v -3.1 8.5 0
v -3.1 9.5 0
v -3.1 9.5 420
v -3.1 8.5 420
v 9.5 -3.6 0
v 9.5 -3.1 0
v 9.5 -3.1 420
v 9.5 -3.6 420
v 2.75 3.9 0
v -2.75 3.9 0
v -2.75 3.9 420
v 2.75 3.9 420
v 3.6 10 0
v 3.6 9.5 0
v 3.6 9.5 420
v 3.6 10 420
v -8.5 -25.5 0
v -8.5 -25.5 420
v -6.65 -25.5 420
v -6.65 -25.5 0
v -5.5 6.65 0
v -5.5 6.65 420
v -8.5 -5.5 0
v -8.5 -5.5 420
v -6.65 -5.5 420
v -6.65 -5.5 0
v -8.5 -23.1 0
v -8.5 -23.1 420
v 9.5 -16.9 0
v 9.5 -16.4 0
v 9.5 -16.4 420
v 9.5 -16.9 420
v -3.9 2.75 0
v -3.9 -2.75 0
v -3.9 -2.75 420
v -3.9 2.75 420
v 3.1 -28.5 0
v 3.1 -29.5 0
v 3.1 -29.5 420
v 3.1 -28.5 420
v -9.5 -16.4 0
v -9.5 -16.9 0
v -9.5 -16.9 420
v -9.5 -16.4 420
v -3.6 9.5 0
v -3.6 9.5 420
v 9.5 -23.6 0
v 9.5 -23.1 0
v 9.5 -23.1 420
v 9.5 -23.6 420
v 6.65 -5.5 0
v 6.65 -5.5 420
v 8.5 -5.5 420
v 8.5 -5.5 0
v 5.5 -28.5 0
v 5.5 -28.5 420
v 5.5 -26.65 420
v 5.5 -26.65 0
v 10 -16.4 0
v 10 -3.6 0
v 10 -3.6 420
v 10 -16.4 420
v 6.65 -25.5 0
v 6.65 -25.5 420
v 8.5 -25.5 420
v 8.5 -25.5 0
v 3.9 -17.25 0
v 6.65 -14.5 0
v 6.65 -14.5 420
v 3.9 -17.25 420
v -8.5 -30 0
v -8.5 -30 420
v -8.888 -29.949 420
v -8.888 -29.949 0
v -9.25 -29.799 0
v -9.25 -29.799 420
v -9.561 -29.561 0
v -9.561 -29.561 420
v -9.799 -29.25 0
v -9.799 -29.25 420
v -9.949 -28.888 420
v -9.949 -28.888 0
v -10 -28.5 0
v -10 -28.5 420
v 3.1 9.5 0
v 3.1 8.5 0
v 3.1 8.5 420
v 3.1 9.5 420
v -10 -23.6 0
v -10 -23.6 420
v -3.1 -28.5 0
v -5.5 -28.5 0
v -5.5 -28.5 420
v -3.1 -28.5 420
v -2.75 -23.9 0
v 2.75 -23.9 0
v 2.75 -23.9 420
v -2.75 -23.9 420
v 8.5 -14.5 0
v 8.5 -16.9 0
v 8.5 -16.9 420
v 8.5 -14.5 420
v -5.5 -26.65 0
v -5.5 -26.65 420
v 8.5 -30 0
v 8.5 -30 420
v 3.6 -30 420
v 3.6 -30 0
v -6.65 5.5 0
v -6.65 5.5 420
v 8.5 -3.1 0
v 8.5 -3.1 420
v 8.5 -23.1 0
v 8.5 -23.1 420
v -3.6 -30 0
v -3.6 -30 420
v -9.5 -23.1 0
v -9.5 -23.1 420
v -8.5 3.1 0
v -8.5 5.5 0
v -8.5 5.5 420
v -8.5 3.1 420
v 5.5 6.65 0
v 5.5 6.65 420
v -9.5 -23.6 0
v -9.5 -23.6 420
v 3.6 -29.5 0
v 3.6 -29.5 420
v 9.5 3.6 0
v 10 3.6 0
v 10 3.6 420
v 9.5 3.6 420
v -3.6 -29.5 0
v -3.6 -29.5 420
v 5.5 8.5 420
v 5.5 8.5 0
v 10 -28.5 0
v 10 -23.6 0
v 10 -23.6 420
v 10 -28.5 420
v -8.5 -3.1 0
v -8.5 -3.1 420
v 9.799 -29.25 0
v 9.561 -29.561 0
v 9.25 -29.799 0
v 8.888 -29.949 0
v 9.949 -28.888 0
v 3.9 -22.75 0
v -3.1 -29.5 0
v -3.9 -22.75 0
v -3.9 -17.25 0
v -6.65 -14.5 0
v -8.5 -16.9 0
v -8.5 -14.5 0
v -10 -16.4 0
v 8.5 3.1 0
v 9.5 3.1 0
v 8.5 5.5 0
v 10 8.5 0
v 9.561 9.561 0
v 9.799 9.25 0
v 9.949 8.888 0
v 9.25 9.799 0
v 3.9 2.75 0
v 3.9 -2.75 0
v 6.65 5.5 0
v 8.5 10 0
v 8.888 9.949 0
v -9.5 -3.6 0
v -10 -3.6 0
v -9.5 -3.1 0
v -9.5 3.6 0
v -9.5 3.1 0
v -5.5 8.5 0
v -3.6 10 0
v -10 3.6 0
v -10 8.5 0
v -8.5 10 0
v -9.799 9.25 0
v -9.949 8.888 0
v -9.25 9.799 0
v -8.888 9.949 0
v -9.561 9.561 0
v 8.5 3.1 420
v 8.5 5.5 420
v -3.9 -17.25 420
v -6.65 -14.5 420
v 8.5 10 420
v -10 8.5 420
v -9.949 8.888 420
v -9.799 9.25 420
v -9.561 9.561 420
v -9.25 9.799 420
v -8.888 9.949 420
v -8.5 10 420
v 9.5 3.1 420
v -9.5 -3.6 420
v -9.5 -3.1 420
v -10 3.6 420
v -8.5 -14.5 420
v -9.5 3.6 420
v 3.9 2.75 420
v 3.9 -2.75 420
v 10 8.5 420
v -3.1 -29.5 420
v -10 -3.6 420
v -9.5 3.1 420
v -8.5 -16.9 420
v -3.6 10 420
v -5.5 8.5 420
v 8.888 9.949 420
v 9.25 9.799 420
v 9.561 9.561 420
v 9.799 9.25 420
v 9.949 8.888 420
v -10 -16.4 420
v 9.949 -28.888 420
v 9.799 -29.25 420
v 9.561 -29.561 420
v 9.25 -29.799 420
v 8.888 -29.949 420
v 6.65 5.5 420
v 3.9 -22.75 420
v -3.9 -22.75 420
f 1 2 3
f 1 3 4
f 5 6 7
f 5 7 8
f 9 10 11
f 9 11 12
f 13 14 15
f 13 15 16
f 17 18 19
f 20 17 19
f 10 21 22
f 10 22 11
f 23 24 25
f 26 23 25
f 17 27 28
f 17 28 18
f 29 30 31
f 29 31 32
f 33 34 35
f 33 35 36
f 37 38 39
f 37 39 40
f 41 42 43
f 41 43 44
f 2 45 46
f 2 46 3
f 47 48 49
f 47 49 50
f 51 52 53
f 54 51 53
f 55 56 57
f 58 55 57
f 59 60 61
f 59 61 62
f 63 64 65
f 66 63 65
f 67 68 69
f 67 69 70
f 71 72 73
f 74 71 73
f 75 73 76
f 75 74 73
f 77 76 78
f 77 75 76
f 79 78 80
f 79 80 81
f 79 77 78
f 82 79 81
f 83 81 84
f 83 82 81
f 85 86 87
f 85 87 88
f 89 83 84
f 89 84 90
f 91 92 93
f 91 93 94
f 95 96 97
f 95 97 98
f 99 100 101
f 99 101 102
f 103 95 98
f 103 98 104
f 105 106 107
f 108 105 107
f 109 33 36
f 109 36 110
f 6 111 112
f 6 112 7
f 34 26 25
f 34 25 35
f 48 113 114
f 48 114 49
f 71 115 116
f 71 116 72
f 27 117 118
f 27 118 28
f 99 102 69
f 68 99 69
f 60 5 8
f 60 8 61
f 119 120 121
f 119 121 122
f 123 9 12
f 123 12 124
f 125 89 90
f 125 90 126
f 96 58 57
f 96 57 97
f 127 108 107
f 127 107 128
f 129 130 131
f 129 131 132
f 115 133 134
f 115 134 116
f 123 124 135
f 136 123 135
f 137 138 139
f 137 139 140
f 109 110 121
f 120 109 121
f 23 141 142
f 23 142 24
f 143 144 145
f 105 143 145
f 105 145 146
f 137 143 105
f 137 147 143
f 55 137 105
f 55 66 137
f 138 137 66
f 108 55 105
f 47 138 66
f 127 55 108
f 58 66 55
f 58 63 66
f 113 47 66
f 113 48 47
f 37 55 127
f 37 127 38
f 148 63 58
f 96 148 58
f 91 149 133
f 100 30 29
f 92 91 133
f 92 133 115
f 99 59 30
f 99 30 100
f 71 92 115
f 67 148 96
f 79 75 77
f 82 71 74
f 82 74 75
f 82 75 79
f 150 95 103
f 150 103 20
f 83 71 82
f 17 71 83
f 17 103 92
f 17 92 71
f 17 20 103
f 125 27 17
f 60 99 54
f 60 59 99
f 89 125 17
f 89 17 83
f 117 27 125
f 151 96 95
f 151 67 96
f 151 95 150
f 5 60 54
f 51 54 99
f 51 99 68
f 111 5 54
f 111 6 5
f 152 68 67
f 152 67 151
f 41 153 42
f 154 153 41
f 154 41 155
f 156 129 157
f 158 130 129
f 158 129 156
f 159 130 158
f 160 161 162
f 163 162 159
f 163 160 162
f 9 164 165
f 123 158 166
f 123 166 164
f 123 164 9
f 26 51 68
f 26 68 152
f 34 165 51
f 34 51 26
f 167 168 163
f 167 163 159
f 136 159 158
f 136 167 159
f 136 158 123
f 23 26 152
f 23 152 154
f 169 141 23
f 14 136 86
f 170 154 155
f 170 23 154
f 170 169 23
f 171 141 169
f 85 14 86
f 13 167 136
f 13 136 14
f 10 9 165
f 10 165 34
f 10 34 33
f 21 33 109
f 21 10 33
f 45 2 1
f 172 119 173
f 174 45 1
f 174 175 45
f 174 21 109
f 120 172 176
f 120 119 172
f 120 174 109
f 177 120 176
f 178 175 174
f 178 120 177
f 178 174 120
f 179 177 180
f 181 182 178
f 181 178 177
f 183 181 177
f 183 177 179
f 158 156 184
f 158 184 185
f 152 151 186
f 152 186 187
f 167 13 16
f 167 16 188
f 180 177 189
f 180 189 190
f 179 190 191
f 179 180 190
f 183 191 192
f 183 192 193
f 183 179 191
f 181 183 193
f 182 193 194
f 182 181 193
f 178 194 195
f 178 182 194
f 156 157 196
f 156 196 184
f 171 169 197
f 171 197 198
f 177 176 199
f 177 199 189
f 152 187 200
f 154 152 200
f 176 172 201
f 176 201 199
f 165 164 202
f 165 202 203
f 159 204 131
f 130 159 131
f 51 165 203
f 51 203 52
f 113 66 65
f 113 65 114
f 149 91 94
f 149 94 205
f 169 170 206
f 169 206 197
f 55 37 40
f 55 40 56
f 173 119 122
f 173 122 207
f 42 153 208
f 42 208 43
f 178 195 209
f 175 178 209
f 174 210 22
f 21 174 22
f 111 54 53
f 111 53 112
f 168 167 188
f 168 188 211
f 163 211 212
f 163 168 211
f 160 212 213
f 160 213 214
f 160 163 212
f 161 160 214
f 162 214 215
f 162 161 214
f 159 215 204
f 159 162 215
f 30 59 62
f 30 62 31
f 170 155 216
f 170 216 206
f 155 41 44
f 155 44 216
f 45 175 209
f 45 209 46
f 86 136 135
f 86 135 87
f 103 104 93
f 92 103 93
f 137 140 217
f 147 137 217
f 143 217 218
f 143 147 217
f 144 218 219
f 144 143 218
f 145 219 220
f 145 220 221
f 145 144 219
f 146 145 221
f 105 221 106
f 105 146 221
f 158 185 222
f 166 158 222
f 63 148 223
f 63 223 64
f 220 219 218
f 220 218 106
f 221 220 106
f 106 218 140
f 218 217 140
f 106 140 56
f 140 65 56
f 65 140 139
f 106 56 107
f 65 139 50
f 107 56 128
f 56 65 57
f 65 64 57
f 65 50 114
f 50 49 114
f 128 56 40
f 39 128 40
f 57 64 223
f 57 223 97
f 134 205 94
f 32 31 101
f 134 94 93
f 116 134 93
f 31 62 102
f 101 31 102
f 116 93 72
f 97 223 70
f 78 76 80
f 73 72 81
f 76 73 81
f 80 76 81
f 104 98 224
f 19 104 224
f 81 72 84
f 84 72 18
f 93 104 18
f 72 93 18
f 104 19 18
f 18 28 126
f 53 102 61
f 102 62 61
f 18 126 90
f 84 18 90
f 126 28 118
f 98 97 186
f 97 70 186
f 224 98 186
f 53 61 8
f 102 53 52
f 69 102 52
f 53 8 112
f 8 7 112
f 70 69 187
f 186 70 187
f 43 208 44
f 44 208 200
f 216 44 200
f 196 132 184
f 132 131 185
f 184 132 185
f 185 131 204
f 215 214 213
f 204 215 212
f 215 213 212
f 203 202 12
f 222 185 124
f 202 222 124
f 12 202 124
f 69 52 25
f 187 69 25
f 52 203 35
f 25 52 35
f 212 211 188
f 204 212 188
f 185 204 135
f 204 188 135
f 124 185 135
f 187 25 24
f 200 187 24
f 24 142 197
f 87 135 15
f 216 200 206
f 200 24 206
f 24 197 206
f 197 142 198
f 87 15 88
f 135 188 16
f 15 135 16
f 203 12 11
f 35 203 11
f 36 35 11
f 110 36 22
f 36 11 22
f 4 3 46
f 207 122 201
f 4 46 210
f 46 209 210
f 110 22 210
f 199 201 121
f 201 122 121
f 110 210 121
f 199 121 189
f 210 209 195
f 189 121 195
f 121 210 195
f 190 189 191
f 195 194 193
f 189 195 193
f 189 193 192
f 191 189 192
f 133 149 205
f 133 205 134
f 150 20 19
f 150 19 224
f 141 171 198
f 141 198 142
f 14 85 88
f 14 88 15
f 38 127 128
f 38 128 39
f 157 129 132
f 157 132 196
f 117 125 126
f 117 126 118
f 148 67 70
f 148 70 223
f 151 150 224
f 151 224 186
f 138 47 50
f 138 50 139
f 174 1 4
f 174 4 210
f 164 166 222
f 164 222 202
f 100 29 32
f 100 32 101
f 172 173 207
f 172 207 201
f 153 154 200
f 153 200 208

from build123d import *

# Parameters (mm, degrees)
EXTRUDE_1_DEPTH = 420


with BuildPart() as part:
    # Sketch1 → 凸台-拉伸1 (new body)
    with BuildSketch(Plane.XY):
        with BuildLine():
            Line((-3.6, 10), (-3.6, 9.5))
            Line((-3.6, 9.5), (-3.1, 9.5))
            Line((-3.1, 9.5), (-3.1, 8.5))
            Line((-3.1, 8.5), (-5.5, 8.5))
            Line((-5.5, 8.5), (-5.5, 6.65))
            Line((-5.5, 6.65), (-2.75, 3.9))
            Line((-2.75, 3.9), (2.75, 3.9))
            Line((2.75, 3.9), (5.5, 6.65))
            Line((5.5, 6.65), (5.5, 8.5))
            Line((5.5, 8.5), (3.1, 8.5))
            Line((3.1, 8.5), (3.1, 9.5))
            Line((3.1, 9.5), (3.6, 9.5))
            Line((3.6, 9.5), (3.6, 10))
            Line((3.6, 10), (8.5, 10))
            ThreePointArc((8.5, 10), (9.560660172, 9.560660172), (10, 8.5))
            Line((10, 8.5), (10, 3.6))
            Line((10, 3.6), (9.5, 3.6))
            Line((9.5, 3.6), (9.5, 3.1))
            Line((9.5, 3.1), (8.5, 3.1))
            Line((8.5, 3.1), (8.5, 5.5))
            Line((8.5, 5.5), (6.65, 5.5))
            Line((6.65, 5.5), (3.9, 2.75))
            Line((3.9, 2.75), (3.9, -2.75))
            Line((3.9, -2.75), (6.65, -5.5))
            Line((6.65, -5.5), (8.5, -5.5))
            Line((8.5, -5.5), (8.5, -3.1))
            Line((8.5, -3.1), (9.5, -3.1))
            Line((9.5, -3.1), (9.5, -3.6))
            Line((9.5, -3.6), (10, -3.6))
            Line((10, -3.6), (10, -16.4))
            Line((10, -16.4), (9.5, -16.4))
            Line((9.5, -16.4), (9.5, -16.9))
            Line((9.5, -16.9), (8.5, -16.9))
            Line((8.5, -16.9), (8.5, -14.5))
            Line((8.5, -14.5), (6.65, -14.5))
            Line((6.65, -14.5), (3.9, -17.25))
            Line((3.9, -17.25), (3.9, -22.75))
            Line((3.9, -22.75), (6.65, -25.5))
            Line((6.65, -25.5), (8.5, -25.5))
            Line((8.5, -25.5), (8.5, -23.1))
            Line((8.5, -23.1), (9.5, -23.1))
            Line((9.5, -23.1), (9.5, -23.6))
            Line((9.5, -23.6), (10, -23.6))
            Line((10, -23.6), (10, -28.5))
            ThreePointArc((10, -28.5), (9.560660172, -29.560660172), (8.5, -30))
            Line((8.5, -30), (3.6, -30))
            Line((3.6, -30), (3.6, -29.5))
            Line((3.6, -29.5), (3.1, -29.5))
            Line((3.1, -29.5), (3.1, -28.5))
            Line((3.1, -28.5), (5.5, -28.5))
            Line((5.5, -28.5), (5.5, -26.65))
            Line((5.5, -26.65), (2.75, -23.9))
            Line((2.75, -23.9), (-2.75, -23.9))
            Line((-2.75, -23.9), (-5.5, -26.65))
            Line((-5.5, -26.65), (-5.5, -28.5))
            Line((-5.5, -28.5), (-3.1, -28.5))
            Line((-3.1, -28.5), (-3.1, -29.5))
            Line((-3.1, -29.5), (-3.6, -29.5))
            Line((-3.6, -29.5), (-3.6, -30))
            Line((-3.6, -30), (-8.5, -30))
            ThreePointArc((-8.5, -30), (-9.560660172, -29.560660172), (-10, -28.5))
            Line((-10, -28.5), (-10, -23.6))
            Line((-10, -23.6), (-9.5, -23.6))
            Line((-9.5, -23.6), (-9.5, -23.1))
            Line((-9.5, -23.1), (-8.5, -23.1))
            Line((-8.5, -23.1), (-8.5, -25.5))
            Line((-8.5, -25.5), (-6.65, -25.5))
            Line((-6.65, -25.5), (-3.9, -22.75))
            Line((-3.9, -22.75), (-3.9, -17.25))
            Line((-3.9, -17.25), (-6.65, -14.5))
            Line((-6.65, -14.5), (-8.5, -14.5))
            Line((-8.5, -14.5), (-8.5, -16.9))
            Line((-8.5, -16.9), (-9.5, -16.9))
            Line((-9.5, -16.9), (-9.5, -16.4))
            Line((-9.5, -16.4), (-10, -16.4))
            Line((-10, -16.4), (-10, -3.6))
            Line((-10, -3.6), (-9.5, -3.6))
            Line((-9.5, -3.6), (-9.5, -3.1))
            Line((-9.5, -3.1), (-8.5, -3.1))
            Line((-8.5, -3.1), (-8.5, -5.5))
            Line((-8.5, -5.5), (-6.65, -5.5))
            Line((-6.65, -5.5), (-3.9, -2.75))
            Line((-3.9, -2.75), (-3.9, 2.75))
            Line((-3.9, 2.75), (-6.65, 5.5))
            Line((-6.65, 5.5), (-8.5, 5.5))
            Line((-8.5, 5.5), (-8.5, 3.1))
            Line((-8.5, 3.1), (-9.5, 3.1))
            Line((-9.5, 3.1), (-9.5, 3.6))
            Line((-9.5, 3.6), (-10, 3.6))
            Line((-10, 3.6), (-10, 8.5))
            ThreePointArc((-10, 8.5), (-9.560660172, 9.560660172), (-8.5, 10))
            Line((-8.5, 10), (-3.6, 10))
        make_face()
    extrude(amount=EXTRUDE_1_DEPTH)


solid = part.part
